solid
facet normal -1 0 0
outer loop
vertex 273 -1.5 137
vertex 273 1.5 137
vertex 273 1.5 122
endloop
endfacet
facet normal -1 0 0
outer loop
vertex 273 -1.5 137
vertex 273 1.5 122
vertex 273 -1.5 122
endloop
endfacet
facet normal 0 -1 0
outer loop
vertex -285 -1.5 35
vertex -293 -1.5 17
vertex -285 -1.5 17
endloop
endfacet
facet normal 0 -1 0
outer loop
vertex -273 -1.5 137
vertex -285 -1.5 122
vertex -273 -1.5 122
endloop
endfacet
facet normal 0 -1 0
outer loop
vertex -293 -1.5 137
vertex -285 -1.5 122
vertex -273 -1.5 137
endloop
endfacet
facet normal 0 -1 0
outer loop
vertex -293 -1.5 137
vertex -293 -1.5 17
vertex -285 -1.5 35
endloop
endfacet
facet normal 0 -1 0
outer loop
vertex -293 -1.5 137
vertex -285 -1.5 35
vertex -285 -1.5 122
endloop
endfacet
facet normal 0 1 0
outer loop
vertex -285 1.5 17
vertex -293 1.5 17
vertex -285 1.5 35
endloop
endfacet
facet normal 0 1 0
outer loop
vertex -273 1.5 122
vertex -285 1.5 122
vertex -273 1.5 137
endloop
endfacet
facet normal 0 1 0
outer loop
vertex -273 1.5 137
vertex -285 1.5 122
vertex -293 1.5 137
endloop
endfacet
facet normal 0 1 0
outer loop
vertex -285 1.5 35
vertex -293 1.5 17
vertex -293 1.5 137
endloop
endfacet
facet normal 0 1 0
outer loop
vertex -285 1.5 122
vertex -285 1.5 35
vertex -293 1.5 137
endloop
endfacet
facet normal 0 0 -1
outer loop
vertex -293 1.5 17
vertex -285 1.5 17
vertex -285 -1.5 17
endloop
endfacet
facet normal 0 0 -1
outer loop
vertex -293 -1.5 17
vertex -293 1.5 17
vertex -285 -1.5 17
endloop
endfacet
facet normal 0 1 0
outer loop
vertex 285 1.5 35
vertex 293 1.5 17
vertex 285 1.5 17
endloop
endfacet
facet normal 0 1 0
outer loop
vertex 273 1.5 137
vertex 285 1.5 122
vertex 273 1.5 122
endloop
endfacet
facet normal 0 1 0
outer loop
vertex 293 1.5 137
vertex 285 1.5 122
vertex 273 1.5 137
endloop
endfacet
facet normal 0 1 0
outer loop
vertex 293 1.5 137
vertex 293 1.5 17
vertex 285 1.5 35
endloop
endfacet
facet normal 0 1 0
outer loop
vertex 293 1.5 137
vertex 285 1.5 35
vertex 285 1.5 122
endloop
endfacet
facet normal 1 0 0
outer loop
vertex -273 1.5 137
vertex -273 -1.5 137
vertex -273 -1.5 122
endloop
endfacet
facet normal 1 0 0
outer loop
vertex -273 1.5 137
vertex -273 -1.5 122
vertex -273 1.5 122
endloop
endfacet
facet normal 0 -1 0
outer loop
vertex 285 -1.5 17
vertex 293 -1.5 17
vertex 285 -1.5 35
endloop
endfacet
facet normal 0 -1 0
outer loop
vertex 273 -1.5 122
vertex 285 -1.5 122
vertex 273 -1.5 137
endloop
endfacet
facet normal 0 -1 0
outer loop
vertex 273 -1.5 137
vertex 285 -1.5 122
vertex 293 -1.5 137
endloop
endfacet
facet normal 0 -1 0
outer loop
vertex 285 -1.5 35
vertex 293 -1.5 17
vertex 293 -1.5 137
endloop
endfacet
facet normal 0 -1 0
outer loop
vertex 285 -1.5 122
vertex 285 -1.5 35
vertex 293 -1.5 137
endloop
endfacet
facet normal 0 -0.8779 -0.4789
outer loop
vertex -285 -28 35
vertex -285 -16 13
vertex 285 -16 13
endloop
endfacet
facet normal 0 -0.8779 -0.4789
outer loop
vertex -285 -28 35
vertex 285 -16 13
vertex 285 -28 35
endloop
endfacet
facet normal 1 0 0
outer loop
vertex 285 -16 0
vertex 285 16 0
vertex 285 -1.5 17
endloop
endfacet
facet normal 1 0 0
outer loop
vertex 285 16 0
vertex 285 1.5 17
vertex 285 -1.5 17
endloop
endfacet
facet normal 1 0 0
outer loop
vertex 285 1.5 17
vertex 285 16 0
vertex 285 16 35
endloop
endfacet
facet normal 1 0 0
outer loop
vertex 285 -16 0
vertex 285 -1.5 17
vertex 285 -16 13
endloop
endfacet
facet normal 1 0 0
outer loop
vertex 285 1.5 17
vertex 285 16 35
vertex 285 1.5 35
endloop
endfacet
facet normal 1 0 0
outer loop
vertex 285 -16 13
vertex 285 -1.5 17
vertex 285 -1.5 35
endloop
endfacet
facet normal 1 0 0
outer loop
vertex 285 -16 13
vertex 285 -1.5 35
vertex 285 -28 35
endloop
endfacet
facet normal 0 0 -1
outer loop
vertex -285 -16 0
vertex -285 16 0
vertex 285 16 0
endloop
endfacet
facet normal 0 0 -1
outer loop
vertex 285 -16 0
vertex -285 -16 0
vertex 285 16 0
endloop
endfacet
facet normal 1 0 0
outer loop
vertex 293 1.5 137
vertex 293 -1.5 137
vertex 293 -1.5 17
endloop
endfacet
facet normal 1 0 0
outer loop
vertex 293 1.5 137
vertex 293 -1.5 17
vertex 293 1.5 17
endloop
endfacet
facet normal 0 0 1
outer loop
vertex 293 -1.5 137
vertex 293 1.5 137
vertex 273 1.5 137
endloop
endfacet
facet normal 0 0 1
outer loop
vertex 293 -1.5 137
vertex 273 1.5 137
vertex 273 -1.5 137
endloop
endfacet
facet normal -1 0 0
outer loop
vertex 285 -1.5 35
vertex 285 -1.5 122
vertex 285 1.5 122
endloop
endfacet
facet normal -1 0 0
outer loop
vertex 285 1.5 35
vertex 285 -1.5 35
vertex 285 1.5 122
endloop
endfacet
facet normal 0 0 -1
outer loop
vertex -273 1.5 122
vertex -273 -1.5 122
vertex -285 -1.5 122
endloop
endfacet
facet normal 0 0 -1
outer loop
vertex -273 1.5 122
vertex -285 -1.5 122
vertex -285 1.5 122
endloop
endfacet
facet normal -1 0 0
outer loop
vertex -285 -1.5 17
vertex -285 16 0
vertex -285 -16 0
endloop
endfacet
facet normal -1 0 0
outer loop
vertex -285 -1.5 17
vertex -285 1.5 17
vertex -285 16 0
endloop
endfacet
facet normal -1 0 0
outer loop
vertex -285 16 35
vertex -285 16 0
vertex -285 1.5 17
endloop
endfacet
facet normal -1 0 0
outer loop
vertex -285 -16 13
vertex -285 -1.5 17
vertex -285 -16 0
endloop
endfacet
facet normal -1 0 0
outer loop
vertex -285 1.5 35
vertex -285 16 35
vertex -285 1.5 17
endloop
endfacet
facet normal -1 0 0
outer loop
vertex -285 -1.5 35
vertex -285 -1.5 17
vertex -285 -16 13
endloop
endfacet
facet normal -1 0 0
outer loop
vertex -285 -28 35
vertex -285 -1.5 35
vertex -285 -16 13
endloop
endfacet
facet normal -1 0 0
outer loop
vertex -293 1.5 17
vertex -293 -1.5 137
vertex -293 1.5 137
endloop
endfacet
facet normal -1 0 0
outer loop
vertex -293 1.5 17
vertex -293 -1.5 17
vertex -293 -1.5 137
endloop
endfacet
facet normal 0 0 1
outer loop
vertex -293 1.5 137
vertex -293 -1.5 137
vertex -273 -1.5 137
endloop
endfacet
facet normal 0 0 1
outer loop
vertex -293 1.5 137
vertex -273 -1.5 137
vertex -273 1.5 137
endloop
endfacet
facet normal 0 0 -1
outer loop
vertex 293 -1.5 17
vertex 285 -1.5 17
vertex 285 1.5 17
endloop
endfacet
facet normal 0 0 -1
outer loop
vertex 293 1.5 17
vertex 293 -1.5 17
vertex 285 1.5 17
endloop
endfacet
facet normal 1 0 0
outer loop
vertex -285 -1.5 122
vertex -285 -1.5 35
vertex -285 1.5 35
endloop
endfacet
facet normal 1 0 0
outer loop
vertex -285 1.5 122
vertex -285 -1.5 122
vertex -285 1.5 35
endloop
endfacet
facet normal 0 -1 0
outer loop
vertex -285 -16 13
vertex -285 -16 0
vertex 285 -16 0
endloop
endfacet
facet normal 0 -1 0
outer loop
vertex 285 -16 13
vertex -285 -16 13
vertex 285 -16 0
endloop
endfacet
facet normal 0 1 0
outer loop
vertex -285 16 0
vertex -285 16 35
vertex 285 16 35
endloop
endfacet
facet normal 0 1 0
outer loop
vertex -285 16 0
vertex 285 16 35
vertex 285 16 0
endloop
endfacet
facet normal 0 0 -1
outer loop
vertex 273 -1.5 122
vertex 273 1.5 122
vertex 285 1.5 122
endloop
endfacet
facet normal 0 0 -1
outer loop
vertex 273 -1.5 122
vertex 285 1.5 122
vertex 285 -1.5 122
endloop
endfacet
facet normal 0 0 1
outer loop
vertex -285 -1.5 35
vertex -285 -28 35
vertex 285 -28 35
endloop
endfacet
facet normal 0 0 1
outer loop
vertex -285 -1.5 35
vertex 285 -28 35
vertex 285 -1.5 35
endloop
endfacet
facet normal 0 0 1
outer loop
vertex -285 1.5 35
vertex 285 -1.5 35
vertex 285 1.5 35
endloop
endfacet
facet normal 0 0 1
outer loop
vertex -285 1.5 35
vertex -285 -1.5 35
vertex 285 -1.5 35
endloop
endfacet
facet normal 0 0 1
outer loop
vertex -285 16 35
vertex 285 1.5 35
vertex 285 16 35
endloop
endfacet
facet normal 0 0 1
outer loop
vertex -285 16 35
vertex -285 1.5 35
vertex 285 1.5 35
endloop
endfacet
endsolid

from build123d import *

# Parameters (mm, degrees)
F0_W      = 570
F0_H      = 32
F1_DEPTH  = 13
F3_DEPTH  = 570
F4_W      = 3
F4_H      = 18
F5_DEPTH  = 8
F6_W      = 8
F6_H      = 3
F7_DEPTH  = 102
F8_W      = 3
F8_H      = 15
F9_DEPTH  = 12
F10_W     = 3
F10_H     = 102
F10_H_2   = 18
F11_DEPTH = 8
F12_W     = 3
F12_H     = 15
F13_DEPTH = 12


with BuildPart() as f1:
    # F0 (on Top) → F1 (new body)
    with BuildSketch(Plane.XY):
        Rectangle(F0_W, F0_H)
    extrude(amount=F1_DEPTH)

    # F2 (on face) → F3 (join)
    with BuildSketch(Plane(origin=(-285, 0, 0), x_dir=(0, -1, 0), z_dir=(-1, 0, 0))):
        Polygon((-16, 13), (16, 13), (28, 35), (-16, 35), align=None)
    extrude(amount=-F3_DEPTH)

    # F4 (on face) → F5 (join)
    with BuildSketch(Plane(origin=(-285, 0, 0), x_dir=(0, -1, 0), z_dir=(-1, 0, 0))):
        with Locations((0, 26)):
            Rectangle(F4_W, F4_H)
    extrude(amount=F5_DEPTH)

    # F6 (on face) → F7 (join)
    with BuildSketch(Plane.XY.offset(35)):
        with Locations((-289, 0)):
            Rectangle(F6_W, F6_H)
    extrude(amount=F7_DEPTH)

    # F8 (on face) → F9 (join)
    with BuildSketch(Plane.YZ.offset(-285)):
        with Locations((0, 129.5)):
            Rectangle(F8_W, F8_H)
    extrude(amount=F9_DEPTH)

    # F10 (on face) → F11 (join)
    with BuildSketch(Plane.YZ.offset(285)):
        with Locations((0, 86)):
            Rectangle(F10_W, F10_H)
        with Locations((0, 26)):
            Rectangle(F10_W, F10_H_2)
    extrude(amount=F11_DEPTH)

    # F12 (on face) → F13 (join)
    with BuildSketch(Plane(origin=(285, 0, 0), x_dir=(0, -1, 0), z_dir=(-1, 0, 0))):
        with Locations((0, 129.5)):
            Rectangle(F12_W, F12_H)
    extrude(amount=F13_DEPTH)


solid = f1.part
